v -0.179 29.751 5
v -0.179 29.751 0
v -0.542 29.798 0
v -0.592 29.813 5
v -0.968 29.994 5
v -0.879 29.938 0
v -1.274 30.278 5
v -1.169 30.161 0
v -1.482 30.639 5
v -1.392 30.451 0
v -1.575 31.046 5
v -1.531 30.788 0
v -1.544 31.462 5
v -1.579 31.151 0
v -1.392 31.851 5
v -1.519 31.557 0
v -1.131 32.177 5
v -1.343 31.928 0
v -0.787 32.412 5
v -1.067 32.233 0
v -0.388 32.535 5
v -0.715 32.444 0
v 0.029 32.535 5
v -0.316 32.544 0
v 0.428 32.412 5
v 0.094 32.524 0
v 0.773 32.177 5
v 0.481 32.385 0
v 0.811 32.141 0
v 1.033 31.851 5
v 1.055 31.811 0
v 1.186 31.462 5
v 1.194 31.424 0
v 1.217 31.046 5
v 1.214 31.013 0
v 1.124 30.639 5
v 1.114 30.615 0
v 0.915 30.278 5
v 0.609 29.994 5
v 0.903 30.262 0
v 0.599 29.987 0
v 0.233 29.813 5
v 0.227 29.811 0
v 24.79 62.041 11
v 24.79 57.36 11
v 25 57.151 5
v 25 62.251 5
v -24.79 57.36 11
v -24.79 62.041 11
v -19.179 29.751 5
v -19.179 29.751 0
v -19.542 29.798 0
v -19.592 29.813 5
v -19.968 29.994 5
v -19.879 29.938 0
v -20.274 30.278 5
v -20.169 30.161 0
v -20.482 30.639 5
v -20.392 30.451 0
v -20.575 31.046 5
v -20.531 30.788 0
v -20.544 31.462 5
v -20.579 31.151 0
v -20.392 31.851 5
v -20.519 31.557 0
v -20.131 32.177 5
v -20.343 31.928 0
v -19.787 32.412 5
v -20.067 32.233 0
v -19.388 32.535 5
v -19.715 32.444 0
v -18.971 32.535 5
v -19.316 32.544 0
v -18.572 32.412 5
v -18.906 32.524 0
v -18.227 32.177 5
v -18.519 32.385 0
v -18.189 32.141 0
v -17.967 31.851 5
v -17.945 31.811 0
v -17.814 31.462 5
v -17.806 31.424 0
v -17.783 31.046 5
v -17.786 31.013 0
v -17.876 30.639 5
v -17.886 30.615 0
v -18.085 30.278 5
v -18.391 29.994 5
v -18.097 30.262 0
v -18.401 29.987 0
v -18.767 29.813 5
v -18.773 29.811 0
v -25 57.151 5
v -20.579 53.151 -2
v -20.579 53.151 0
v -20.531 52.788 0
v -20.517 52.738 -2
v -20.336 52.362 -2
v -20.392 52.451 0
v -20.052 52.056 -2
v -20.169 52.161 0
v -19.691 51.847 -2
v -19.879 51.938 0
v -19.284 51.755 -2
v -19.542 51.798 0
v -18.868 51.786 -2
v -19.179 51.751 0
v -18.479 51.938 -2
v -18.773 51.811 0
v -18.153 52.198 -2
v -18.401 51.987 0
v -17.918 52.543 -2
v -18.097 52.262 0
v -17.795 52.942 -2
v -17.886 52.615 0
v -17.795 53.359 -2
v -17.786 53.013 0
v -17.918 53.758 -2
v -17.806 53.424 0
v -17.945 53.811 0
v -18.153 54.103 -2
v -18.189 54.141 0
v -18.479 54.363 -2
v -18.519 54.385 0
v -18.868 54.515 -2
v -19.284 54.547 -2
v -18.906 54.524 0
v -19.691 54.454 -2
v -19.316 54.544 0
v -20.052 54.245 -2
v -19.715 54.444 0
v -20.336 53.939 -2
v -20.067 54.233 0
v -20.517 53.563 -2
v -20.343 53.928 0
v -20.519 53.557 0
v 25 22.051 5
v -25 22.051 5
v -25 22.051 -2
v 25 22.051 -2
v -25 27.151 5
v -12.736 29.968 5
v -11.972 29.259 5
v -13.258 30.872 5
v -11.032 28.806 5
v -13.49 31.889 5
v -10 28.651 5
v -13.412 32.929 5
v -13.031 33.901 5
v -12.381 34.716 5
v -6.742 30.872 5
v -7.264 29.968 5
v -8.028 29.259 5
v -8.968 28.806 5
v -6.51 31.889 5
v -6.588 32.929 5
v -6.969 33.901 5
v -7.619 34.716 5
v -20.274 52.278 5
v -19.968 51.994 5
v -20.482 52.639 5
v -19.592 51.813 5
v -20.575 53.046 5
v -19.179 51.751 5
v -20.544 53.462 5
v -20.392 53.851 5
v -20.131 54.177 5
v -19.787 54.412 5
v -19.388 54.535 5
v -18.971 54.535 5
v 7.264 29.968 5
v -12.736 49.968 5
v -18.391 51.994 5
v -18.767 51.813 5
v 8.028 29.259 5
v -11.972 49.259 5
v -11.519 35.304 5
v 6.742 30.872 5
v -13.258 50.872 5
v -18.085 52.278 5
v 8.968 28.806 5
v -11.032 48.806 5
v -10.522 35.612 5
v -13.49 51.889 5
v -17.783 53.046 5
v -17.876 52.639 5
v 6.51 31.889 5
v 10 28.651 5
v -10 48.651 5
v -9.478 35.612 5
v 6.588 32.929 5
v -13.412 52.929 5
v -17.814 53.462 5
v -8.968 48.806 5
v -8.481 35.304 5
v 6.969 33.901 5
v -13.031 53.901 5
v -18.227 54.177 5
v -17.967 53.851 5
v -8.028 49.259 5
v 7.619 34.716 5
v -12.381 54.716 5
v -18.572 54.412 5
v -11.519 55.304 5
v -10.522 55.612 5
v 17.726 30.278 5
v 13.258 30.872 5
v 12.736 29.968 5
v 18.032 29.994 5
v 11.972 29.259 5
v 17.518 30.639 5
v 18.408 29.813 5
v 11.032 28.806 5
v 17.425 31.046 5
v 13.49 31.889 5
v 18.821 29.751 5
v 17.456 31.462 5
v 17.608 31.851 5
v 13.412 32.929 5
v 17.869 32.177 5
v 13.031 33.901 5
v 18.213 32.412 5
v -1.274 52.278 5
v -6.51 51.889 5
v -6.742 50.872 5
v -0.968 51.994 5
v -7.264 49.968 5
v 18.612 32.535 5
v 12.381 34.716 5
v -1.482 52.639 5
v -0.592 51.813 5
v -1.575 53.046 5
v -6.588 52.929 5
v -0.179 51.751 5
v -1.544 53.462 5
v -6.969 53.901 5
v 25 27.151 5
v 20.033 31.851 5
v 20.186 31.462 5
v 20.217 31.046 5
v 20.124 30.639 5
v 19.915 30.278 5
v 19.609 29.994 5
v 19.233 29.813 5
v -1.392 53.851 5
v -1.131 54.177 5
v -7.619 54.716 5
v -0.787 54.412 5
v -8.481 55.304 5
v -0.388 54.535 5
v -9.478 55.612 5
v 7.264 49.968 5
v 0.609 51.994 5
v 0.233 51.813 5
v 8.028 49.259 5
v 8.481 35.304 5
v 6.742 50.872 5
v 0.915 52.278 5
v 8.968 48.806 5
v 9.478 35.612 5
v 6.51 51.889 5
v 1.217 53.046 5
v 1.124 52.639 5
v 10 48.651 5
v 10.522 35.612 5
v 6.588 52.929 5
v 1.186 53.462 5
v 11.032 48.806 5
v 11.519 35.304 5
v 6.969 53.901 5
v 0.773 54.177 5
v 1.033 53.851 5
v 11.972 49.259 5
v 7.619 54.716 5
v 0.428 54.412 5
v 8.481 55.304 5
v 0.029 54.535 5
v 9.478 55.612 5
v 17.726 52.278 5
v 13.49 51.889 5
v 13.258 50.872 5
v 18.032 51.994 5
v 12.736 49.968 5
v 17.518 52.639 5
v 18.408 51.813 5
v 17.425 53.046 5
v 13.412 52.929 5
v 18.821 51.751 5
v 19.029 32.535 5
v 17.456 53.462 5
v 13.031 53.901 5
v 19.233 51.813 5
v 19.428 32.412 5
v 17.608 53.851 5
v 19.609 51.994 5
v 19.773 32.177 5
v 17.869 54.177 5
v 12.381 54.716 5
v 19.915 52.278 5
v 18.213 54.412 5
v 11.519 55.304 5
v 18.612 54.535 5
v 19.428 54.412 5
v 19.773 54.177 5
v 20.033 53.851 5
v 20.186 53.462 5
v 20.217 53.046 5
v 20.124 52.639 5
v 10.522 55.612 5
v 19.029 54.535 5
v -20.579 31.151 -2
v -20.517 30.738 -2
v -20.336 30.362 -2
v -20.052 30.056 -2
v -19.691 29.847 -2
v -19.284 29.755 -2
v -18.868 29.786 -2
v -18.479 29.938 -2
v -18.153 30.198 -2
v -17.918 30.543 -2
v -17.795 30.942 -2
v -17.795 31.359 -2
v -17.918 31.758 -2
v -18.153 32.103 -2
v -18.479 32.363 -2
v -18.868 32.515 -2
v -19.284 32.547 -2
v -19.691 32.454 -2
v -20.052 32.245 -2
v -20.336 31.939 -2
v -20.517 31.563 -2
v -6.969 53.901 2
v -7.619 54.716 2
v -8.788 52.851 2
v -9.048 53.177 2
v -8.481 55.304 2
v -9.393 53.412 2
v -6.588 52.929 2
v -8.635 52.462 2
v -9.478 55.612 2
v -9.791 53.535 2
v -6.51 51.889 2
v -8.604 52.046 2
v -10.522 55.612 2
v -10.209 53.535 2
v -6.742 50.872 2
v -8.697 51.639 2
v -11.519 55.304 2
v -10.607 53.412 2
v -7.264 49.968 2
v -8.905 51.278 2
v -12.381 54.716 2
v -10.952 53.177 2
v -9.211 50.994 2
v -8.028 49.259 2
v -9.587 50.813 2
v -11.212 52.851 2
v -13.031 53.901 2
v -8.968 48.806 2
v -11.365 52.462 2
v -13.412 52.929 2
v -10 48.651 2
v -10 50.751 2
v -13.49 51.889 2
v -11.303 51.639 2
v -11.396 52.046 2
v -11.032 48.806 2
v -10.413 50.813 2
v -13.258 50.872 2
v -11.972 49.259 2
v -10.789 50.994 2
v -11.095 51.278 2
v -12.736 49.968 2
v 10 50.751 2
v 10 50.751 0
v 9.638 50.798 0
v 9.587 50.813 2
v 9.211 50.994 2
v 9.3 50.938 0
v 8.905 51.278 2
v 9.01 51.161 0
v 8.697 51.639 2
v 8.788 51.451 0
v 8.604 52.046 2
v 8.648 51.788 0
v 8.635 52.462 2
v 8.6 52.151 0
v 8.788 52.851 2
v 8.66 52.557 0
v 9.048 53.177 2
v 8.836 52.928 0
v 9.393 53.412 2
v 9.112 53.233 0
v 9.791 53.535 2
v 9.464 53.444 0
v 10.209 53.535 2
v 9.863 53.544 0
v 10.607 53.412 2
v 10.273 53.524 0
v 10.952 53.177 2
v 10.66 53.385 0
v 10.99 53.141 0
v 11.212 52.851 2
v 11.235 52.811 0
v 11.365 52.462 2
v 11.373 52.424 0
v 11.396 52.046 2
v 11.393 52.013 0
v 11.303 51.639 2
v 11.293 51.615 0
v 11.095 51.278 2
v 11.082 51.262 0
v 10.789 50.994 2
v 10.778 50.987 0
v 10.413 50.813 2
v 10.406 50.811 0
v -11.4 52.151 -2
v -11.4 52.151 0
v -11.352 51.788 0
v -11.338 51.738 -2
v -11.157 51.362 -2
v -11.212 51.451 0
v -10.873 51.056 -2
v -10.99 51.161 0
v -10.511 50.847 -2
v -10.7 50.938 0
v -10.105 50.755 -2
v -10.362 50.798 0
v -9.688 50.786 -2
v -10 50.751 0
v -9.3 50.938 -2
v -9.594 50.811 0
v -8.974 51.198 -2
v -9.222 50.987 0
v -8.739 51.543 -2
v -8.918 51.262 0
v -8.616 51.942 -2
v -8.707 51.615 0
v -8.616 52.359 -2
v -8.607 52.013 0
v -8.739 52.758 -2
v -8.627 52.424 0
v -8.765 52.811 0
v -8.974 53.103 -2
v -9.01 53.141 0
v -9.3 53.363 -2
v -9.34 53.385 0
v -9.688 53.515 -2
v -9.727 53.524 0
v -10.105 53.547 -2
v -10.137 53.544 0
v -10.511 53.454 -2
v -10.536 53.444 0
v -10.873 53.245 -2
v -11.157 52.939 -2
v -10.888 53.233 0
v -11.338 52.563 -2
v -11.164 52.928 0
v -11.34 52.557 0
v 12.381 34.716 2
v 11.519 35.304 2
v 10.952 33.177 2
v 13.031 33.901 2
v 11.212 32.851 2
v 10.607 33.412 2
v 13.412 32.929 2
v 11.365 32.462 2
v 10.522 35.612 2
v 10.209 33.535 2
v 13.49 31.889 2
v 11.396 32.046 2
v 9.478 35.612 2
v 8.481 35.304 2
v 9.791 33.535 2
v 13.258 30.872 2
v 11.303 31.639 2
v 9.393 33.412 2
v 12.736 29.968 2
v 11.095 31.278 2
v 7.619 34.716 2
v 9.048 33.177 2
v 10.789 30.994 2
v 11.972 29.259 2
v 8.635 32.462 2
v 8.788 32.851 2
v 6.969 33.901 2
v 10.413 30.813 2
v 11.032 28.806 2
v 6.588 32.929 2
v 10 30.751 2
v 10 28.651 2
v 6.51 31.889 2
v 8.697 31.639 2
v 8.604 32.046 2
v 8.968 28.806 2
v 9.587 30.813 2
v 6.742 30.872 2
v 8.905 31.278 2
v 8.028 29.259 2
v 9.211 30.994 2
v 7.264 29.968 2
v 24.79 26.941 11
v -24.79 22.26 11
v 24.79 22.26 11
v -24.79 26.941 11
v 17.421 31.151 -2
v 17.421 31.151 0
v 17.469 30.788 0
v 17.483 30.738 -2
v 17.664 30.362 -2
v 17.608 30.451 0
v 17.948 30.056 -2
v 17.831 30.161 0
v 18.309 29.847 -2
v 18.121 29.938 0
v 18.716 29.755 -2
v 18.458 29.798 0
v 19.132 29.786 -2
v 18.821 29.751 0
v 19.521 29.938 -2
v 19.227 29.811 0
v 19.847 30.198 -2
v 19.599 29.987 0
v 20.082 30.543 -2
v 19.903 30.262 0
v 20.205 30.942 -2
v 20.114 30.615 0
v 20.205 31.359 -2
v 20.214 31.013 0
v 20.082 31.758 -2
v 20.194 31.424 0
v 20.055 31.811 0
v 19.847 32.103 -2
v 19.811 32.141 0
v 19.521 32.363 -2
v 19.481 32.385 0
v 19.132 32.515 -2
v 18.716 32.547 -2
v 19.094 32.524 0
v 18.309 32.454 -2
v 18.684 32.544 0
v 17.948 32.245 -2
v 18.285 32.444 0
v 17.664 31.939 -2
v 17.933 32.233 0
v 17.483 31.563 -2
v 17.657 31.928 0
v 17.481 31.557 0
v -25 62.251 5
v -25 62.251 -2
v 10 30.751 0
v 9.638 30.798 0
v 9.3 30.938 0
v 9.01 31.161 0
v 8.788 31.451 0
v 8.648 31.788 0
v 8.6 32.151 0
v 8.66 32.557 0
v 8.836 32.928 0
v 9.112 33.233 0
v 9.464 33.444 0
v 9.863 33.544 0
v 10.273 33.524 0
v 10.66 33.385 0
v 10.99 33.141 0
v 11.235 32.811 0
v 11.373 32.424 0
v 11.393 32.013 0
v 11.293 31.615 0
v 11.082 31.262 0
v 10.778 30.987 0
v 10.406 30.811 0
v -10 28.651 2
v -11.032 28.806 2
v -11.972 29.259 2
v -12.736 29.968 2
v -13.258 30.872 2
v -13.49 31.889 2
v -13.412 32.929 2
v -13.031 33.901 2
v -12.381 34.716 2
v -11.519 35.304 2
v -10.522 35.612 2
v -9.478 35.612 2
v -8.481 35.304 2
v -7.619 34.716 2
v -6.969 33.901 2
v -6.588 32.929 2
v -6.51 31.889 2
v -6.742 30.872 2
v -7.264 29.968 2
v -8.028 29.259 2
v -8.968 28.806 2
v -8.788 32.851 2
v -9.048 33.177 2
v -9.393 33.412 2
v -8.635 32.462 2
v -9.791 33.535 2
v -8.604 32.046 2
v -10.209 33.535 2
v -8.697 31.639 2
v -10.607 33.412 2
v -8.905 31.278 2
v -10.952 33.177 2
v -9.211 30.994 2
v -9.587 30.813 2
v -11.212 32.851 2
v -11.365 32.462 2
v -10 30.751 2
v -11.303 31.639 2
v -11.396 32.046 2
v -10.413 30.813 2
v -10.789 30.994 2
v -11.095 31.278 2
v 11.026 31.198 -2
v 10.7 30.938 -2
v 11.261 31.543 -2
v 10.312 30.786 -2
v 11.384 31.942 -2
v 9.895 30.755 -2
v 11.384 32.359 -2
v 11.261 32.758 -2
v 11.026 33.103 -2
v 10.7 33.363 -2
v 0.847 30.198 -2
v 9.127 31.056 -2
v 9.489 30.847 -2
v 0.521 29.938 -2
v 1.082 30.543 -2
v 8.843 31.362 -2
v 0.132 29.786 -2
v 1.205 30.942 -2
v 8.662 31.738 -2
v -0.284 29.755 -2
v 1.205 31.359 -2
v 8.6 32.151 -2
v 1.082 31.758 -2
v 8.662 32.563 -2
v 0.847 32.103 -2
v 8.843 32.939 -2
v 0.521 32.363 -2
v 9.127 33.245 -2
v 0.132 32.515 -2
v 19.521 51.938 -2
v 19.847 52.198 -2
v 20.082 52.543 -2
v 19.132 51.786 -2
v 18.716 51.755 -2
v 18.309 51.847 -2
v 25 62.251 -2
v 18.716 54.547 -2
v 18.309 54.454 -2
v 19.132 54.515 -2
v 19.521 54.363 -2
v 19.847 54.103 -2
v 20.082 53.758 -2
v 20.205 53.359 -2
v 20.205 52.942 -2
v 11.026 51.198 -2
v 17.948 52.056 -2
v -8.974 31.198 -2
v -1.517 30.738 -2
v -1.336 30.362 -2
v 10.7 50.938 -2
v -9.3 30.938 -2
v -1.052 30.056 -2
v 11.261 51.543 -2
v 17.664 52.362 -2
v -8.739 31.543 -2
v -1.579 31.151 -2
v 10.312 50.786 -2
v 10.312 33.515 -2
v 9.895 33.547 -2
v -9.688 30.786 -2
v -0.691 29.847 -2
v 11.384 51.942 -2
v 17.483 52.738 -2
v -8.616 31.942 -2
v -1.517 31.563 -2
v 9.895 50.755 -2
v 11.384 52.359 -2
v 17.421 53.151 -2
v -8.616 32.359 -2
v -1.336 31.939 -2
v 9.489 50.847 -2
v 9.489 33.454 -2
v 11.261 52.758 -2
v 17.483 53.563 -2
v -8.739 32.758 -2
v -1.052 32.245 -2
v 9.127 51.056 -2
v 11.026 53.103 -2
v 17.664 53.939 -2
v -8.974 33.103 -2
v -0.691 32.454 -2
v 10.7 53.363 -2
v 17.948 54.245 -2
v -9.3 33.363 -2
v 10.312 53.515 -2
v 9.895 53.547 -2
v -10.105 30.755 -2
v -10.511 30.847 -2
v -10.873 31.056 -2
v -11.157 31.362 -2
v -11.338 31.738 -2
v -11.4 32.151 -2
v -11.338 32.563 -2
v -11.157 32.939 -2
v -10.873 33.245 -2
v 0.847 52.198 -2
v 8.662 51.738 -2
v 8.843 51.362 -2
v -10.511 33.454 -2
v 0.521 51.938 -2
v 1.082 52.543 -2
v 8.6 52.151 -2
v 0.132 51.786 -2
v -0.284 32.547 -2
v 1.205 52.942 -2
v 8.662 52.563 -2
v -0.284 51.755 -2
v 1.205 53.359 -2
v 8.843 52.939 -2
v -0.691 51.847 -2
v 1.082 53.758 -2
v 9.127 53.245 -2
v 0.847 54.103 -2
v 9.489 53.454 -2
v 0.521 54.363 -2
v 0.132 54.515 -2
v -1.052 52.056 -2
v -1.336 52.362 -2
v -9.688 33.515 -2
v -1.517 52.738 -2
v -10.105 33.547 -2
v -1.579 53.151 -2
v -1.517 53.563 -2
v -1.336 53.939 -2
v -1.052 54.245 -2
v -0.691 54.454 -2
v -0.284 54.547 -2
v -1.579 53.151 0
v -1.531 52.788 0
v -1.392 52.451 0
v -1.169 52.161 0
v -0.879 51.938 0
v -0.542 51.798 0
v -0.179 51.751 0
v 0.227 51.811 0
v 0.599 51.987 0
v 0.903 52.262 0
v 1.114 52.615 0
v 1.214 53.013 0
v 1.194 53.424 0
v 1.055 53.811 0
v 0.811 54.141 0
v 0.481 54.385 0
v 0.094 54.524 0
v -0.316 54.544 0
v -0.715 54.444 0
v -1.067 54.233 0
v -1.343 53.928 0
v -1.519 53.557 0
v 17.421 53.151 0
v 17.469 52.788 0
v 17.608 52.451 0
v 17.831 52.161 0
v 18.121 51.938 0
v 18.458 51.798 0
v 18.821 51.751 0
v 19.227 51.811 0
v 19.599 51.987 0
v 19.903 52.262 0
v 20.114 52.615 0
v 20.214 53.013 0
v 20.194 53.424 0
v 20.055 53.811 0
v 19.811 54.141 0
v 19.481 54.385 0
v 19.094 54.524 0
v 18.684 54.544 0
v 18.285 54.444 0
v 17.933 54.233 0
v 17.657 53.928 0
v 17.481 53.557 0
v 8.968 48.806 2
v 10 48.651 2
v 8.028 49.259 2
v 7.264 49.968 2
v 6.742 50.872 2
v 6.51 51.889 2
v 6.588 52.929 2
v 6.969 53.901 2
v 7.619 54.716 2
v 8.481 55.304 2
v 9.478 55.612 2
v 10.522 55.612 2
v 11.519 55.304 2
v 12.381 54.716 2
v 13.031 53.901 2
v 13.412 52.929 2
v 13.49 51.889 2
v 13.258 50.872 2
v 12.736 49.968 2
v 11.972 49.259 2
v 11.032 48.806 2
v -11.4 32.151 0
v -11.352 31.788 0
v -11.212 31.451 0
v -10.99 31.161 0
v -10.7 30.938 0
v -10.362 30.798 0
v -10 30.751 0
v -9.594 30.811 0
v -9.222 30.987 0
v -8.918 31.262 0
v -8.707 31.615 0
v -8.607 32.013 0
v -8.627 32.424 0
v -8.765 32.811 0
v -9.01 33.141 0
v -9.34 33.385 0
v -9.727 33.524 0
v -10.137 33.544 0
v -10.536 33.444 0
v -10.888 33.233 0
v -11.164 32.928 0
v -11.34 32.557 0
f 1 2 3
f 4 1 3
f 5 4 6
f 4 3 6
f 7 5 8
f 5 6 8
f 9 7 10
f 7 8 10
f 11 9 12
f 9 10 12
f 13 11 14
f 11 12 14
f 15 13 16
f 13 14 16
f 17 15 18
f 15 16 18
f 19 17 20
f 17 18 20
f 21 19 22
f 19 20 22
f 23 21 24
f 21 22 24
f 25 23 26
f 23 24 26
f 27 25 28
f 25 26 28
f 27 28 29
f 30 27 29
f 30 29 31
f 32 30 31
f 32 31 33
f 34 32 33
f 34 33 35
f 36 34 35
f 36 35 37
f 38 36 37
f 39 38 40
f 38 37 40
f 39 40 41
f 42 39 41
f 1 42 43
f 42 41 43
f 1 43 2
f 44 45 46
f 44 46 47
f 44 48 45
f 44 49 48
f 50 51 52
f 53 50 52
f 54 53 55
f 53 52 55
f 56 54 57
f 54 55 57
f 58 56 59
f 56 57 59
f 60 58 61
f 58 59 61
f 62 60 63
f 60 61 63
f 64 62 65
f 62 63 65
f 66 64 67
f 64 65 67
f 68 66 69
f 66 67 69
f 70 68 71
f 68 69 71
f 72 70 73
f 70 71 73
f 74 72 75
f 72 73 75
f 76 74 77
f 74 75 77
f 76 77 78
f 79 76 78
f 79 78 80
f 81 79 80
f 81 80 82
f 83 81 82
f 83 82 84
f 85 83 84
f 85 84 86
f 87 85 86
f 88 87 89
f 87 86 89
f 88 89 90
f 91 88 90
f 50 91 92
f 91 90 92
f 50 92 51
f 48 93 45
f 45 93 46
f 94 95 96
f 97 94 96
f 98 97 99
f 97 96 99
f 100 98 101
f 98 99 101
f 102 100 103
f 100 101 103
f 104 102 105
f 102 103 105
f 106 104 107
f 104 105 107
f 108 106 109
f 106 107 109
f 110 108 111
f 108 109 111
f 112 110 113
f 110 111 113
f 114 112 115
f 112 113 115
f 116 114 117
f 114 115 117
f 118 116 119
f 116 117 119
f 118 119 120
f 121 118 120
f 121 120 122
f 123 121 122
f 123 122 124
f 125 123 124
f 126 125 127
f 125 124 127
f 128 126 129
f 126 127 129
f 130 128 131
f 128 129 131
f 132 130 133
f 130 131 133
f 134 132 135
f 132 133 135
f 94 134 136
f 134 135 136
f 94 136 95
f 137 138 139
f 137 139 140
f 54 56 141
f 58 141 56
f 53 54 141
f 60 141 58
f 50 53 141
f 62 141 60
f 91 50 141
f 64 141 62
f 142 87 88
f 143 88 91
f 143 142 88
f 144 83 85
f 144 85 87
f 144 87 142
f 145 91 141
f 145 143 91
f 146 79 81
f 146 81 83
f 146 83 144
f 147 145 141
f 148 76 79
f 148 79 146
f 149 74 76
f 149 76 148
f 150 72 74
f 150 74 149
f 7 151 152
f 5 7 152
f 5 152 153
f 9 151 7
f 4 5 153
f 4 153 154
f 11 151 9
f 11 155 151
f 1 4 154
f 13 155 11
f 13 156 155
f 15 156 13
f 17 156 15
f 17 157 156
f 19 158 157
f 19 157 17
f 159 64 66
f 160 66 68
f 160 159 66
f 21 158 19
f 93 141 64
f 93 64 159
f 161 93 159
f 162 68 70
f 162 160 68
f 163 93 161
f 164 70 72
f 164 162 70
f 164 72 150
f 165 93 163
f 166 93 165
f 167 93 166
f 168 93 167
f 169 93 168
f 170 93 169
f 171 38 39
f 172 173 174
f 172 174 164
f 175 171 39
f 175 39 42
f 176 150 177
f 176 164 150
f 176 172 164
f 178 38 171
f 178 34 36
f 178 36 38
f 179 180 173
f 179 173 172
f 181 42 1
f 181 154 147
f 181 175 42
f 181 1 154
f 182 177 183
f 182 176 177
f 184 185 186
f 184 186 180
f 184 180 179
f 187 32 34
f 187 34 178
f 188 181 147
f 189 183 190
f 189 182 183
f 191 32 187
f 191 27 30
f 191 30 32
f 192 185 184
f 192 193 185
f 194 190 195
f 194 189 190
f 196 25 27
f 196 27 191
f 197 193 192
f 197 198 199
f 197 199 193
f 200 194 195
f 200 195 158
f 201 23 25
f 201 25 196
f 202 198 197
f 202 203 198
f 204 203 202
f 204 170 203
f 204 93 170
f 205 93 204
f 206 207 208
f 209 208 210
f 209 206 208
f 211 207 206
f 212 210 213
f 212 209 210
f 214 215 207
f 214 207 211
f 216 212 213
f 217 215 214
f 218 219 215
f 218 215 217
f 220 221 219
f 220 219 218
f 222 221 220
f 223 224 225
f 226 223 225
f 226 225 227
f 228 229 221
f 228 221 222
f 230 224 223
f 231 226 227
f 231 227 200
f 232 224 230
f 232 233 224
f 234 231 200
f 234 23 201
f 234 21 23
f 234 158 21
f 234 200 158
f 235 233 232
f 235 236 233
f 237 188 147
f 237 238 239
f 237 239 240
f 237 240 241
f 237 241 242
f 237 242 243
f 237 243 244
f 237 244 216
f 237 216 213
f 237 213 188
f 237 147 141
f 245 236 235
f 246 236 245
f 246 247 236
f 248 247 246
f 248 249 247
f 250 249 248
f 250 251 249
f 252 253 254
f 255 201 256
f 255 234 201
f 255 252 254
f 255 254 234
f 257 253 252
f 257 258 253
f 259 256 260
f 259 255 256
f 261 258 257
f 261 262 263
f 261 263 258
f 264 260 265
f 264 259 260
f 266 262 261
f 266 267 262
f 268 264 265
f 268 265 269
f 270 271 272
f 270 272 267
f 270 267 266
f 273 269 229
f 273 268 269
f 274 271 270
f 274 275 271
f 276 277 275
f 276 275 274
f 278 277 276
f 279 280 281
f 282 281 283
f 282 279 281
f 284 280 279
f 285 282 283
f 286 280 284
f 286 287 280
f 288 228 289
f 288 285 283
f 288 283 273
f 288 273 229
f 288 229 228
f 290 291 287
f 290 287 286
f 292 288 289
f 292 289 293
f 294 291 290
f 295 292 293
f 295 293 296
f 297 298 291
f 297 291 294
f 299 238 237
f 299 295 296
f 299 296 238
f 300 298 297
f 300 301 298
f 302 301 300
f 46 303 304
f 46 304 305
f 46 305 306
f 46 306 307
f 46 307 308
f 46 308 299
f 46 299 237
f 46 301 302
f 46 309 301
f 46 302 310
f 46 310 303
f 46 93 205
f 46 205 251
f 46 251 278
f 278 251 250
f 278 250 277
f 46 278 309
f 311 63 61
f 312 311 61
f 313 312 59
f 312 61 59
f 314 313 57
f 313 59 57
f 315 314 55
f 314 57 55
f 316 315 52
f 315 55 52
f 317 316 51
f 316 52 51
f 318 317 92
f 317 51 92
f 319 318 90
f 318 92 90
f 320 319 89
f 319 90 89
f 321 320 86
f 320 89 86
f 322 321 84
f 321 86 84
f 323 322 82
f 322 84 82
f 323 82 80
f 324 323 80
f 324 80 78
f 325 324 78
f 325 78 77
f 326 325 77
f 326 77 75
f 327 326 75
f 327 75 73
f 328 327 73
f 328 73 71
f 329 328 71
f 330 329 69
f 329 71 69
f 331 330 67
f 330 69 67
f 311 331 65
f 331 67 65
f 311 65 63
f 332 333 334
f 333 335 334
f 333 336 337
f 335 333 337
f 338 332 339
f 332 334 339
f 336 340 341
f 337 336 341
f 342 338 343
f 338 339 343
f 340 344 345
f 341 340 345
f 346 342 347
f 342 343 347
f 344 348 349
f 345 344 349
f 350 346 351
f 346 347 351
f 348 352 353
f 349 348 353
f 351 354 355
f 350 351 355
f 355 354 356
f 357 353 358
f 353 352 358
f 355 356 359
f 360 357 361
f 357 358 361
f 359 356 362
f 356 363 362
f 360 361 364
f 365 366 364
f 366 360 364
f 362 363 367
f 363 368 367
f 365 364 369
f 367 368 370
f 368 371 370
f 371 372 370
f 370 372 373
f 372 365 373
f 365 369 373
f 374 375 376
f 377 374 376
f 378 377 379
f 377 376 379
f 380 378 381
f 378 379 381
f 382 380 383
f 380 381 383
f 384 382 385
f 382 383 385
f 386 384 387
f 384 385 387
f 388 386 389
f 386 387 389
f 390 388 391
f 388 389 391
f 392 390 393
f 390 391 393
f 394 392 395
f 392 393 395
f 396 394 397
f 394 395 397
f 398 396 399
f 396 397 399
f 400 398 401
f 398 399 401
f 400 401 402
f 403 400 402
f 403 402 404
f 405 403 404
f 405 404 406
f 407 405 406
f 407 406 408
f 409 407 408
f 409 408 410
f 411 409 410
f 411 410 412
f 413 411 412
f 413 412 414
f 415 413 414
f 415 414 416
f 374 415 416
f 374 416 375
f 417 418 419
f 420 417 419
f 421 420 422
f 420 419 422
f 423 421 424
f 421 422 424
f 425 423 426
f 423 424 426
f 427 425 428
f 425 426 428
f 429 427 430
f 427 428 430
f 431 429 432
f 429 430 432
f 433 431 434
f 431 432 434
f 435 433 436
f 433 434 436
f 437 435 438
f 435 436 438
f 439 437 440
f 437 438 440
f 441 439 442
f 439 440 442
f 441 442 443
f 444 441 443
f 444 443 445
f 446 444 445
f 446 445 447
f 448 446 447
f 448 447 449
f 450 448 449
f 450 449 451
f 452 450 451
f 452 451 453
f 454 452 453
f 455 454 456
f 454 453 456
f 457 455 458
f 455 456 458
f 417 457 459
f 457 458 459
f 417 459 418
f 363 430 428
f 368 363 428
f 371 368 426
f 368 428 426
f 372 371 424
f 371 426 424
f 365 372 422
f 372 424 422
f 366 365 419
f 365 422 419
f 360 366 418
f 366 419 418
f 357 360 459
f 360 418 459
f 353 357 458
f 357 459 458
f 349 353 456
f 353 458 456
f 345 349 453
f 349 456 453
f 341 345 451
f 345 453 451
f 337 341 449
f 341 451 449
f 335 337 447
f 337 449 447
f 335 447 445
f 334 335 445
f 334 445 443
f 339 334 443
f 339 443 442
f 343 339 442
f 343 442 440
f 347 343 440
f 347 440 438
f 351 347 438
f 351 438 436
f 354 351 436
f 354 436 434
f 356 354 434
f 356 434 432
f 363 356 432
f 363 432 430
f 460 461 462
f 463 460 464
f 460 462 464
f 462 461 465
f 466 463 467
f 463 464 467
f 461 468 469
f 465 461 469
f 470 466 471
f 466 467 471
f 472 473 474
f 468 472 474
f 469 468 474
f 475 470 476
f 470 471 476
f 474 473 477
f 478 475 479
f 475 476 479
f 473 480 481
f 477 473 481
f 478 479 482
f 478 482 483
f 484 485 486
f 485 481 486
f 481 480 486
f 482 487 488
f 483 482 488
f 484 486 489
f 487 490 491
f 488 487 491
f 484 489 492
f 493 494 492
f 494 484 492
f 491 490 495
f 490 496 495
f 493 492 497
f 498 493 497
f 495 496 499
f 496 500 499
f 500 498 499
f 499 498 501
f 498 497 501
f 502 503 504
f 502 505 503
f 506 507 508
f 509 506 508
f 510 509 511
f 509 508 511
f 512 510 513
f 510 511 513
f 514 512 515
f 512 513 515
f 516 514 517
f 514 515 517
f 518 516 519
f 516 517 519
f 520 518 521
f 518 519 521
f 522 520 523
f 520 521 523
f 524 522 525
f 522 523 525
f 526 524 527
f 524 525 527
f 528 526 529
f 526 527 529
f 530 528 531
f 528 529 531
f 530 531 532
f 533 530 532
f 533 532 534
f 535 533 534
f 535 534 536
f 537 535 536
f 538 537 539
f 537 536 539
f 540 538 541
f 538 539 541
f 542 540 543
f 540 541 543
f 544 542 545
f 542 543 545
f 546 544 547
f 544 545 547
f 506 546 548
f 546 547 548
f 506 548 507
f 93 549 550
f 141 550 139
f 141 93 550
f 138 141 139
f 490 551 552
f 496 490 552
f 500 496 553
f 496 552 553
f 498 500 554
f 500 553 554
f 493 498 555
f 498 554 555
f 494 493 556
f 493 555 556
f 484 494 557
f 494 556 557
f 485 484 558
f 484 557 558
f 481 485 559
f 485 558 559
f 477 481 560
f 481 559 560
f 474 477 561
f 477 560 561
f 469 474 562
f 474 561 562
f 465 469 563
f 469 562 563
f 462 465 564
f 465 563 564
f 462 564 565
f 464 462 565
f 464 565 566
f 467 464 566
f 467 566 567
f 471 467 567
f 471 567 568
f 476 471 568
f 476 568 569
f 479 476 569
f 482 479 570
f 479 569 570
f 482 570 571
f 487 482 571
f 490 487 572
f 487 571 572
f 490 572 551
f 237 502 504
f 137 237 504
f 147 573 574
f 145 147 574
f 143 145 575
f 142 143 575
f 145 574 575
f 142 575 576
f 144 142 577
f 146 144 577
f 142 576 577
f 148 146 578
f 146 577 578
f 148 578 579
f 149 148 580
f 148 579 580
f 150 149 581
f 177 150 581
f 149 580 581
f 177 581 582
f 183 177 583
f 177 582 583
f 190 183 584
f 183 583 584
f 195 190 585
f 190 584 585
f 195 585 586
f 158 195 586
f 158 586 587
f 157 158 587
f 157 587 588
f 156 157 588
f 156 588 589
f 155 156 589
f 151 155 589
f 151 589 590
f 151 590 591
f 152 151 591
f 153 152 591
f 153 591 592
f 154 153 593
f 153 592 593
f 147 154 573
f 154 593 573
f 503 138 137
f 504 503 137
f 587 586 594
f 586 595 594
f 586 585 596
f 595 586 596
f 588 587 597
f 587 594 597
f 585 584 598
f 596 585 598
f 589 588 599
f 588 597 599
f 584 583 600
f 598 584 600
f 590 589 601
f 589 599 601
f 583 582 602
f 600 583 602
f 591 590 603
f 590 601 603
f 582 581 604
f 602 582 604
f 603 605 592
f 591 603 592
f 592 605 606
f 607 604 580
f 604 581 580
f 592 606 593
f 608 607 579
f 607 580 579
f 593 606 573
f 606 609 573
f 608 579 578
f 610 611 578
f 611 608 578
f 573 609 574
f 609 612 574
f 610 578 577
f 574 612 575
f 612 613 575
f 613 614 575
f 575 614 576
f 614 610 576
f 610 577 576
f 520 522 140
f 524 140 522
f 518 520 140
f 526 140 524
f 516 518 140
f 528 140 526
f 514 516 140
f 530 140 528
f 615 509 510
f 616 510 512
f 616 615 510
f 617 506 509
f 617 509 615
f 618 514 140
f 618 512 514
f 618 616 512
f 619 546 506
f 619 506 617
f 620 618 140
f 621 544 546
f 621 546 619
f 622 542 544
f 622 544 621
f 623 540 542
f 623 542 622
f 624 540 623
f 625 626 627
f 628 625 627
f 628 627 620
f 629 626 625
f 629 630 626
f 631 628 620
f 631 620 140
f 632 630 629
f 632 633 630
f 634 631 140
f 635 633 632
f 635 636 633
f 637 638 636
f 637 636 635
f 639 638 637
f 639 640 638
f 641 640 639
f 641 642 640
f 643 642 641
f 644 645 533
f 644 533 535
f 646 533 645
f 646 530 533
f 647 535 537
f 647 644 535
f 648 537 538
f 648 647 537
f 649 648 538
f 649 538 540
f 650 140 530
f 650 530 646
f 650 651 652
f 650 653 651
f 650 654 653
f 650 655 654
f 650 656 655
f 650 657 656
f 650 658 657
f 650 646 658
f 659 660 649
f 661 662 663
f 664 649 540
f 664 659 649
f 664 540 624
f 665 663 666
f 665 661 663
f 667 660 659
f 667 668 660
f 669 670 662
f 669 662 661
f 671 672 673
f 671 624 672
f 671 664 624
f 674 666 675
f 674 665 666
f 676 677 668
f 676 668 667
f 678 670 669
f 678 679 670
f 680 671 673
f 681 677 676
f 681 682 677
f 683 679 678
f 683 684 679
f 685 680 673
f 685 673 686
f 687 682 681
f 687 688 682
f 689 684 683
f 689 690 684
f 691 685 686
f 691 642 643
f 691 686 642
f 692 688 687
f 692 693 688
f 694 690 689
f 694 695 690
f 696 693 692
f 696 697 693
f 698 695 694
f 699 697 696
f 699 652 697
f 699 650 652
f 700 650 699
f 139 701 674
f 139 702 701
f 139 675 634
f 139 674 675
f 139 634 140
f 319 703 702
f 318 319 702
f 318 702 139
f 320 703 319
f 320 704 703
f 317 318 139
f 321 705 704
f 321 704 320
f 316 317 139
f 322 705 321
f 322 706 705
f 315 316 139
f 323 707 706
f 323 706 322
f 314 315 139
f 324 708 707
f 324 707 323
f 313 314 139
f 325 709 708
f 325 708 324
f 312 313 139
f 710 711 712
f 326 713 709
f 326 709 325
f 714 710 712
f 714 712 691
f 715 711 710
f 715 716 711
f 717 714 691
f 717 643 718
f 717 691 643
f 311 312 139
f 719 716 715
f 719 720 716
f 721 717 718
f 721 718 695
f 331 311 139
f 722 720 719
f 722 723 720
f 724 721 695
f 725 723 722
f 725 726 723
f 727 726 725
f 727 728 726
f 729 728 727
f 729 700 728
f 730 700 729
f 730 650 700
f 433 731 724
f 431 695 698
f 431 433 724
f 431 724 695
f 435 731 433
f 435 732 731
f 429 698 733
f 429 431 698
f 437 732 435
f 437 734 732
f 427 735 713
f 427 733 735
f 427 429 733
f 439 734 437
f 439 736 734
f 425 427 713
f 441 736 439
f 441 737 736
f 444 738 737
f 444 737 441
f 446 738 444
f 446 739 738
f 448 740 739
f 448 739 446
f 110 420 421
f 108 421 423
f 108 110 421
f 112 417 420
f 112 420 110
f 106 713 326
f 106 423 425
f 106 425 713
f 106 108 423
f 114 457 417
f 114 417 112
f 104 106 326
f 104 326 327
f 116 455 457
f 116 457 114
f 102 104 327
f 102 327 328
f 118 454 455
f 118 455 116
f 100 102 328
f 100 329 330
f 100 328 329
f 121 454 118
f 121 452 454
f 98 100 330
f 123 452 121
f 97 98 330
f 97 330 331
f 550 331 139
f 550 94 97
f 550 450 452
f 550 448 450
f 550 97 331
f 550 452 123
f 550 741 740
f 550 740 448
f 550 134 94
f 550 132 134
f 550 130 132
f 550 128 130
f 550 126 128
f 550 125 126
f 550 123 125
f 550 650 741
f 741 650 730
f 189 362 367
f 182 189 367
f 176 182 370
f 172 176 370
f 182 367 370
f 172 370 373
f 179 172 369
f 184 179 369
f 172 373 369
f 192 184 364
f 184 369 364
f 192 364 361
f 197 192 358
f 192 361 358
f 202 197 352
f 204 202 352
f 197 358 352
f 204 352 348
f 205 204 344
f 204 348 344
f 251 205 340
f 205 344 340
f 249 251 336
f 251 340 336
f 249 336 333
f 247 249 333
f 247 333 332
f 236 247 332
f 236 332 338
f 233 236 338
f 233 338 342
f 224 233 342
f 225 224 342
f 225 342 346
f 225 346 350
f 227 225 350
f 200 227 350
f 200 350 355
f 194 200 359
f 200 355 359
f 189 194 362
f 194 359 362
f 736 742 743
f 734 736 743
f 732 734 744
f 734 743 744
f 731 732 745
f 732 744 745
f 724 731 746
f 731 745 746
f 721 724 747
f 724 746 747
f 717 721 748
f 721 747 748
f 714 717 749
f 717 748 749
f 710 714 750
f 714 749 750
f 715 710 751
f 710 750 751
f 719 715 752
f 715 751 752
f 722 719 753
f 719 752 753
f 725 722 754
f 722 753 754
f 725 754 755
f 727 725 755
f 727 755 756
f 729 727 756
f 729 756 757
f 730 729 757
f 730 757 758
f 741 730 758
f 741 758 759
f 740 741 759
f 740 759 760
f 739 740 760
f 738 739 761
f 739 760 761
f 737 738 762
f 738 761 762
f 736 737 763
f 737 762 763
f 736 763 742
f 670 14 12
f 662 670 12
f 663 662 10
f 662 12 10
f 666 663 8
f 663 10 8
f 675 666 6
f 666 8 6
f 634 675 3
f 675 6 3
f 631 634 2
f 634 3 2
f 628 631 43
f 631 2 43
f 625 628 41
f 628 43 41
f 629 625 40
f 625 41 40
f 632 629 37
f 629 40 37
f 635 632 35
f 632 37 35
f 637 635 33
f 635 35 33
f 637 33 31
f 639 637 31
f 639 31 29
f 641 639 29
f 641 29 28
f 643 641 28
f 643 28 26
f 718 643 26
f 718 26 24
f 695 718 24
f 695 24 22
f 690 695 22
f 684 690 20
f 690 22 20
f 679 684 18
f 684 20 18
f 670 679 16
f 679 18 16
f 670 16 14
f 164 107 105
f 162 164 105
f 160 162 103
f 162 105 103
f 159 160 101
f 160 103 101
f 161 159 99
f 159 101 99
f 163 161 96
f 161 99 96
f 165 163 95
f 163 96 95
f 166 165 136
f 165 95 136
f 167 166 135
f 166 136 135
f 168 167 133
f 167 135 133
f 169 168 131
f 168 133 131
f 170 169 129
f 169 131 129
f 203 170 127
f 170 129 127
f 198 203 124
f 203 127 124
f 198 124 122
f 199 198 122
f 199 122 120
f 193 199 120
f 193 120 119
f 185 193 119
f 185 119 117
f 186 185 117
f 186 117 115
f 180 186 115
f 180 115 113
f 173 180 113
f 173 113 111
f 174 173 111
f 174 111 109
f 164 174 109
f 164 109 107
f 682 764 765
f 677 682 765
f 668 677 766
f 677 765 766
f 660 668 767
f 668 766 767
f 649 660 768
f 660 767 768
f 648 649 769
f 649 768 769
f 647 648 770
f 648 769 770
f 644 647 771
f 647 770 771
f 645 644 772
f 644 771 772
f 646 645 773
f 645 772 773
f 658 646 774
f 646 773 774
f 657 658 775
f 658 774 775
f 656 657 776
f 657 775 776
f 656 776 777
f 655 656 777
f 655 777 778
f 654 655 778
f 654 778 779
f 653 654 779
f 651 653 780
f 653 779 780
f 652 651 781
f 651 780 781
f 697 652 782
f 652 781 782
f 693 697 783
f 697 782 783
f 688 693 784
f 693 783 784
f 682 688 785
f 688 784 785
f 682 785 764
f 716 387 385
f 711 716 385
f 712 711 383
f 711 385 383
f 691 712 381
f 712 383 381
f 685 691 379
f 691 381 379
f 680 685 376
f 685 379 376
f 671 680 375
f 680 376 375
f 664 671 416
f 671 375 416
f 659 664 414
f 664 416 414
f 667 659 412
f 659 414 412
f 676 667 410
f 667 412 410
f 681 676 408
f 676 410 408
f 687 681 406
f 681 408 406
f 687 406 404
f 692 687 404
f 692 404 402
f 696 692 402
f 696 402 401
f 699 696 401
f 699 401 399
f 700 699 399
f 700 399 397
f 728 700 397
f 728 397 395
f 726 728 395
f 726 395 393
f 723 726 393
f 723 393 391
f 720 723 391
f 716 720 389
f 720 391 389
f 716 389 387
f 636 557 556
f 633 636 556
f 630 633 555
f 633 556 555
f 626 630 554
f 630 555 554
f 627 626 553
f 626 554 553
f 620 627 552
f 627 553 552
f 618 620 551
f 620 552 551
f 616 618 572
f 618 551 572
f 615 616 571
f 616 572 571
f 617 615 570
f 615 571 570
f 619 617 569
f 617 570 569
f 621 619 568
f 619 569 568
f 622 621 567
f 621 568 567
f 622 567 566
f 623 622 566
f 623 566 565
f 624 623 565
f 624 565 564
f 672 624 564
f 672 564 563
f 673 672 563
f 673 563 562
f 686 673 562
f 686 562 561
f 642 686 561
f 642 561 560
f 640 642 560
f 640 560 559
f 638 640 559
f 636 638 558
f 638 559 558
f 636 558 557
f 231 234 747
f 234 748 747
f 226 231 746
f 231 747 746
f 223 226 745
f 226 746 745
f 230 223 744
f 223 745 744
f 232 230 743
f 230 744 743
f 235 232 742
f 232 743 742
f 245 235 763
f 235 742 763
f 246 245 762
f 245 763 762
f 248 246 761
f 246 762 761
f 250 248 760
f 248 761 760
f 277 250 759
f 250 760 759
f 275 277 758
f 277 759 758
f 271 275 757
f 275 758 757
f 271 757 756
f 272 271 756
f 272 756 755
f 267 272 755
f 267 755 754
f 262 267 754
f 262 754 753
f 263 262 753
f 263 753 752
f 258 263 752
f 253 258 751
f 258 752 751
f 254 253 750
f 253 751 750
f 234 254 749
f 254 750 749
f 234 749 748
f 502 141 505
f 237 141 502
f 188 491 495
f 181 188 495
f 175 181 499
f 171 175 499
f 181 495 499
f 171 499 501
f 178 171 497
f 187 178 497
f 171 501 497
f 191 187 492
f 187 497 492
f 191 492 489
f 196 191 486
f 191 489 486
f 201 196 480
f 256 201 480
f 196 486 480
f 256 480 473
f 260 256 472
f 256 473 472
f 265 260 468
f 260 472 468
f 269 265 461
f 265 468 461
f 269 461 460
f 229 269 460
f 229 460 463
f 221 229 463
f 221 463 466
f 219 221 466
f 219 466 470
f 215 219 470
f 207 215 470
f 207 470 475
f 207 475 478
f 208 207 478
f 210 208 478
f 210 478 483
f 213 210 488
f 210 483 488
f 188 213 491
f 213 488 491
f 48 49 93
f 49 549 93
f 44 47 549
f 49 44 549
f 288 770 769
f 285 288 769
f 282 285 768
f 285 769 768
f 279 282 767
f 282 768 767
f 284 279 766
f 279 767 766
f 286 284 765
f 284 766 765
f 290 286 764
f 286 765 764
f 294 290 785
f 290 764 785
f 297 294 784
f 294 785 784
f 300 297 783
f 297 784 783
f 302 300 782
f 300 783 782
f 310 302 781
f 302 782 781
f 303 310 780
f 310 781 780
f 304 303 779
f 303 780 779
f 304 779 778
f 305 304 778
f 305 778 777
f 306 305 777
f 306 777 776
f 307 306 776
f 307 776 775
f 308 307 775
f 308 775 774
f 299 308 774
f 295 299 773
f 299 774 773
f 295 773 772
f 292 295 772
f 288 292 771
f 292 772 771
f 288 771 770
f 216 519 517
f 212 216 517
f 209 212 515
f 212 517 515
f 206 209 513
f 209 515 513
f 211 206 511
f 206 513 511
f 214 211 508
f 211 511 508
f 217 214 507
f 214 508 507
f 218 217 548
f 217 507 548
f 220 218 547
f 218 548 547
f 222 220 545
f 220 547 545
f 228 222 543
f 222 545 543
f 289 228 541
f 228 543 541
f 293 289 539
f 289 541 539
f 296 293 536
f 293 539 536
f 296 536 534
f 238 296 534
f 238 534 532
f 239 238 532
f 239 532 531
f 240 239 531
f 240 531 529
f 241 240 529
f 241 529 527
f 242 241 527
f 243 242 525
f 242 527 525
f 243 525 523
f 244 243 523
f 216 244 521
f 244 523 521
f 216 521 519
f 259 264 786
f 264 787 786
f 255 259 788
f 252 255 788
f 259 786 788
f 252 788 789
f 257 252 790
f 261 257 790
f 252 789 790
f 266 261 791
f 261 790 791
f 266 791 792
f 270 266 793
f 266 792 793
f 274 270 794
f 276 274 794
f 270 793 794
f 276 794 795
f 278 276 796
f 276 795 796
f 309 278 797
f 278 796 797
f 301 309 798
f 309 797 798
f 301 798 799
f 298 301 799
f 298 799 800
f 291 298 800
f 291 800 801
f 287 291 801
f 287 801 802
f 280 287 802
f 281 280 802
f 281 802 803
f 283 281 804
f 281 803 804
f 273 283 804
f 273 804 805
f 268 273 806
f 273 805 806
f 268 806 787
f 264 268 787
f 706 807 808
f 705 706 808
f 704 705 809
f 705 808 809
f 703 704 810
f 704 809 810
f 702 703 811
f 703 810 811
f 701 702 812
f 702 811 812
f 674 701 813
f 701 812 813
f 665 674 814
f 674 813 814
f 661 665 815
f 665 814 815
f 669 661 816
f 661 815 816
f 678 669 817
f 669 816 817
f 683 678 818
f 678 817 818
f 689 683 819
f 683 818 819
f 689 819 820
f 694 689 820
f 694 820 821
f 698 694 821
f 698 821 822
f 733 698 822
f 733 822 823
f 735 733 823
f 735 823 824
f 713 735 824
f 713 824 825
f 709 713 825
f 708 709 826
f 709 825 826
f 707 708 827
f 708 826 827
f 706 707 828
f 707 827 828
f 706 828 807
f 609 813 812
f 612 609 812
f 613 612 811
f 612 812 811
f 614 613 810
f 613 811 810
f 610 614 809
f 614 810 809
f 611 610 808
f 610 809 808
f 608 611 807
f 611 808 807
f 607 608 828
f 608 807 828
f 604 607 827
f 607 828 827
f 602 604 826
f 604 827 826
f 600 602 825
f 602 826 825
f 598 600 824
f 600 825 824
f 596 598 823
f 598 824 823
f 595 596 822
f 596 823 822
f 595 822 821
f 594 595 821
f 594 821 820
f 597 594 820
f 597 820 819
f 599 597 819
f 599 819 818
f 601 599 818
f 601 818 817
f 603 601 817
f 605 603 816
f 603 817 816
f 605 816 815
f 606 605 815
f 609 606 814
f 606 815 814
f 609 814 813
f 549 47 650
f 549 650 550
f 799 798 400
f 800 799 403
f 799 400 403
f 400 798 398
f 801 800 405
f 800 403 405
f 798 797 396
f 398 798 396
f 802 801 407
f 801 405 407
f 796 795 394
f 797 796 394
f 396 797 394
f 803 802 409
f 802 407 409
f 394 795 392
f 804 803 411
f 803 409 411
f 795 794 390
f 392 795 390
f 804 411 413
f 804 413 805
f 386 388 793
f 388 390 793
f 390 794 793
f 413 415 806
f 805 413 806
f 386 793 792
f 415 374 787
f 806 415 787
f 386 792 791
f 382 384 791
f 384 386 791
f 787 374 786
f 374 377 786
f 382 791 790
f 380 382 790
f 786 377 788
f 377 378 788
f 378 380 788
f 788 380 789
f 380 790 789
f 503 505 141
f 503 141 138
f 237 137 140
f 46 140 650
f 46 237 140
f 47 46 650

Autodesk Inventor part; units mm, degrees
ref_plane "YZ Plane" through (0, 0, 0) normal (1, 0, 0) x (0, 1, 0)
ref_plane "XZ Plane" through (0, 0, 0) normal (0, 1, 0) x (-1, 0, 0)
ref_plane "Arbeitsebene1" through (0, 0, 0) normal (0, 0, 1) x (1, 0, 0)
sketch "Skizze1" plane through (0, 0, 0) normal (0, 0, 1) x (1, 0, 0)
  line L0 (15, 26.0506) -> (15, 58.2506) projected
  line L1 (15, 58.2506) -> (-15, 58.2506) projected
  line L2 (-15, 58.2506) -> (-15, 26.0506) projected
  line L3 (-15, 26.0506) -> (15, 26.0506) projected
  circle A0 centre (10, 32.1506) radius 1.25 construction
  circle A1 centre (-10, 32.1506) radius 1.25 construction
  circle A2 centre (-10, 52.1506) radius 1.25 construction
  circle A3 centre (10, 52.1506) radius 1.25 construction
  circle A4 centre (7.5, 38.0506) radius 3.25 construction
  circle A5 centre (7.5, 46.2506) radius 3.25 construction
  circle A6 centre (-7.5, 38.0506) radius 3.25 construction
  circle A7 centre (-7.5, 46.2506) radius 3.25 construction
  line L4 (-65, 27.1506) -> (-65, 57.1506) projected
  circle A8 centre (10, 32.1506) radius 1.25
  circle A9 centre (-10, 32.1506) radius 1.25
  circle A10 centre (-10, 52.1506) radius 1.25
  circle A11 centre (10, 52.1506) radius 1.25
  line L5 (15, 58.2506) -> (25, 58.2506)
  line L6 (25, 58.2506) -> (25, 26.0506)
  line L7 (25, 26.0506) -> (15, 26.0506)
  line L8 (15, 26.0506) -> (15, 58.2506)
  line L9 (-15, 58.2506) -> (-25, 58.2506)
  line L10 (-25, 58.2506) -> (-25, 26.0506)
  line L11 (-25, 26.0506) -> (-15, 26.0506)
  line L12 (-15, 26.0506) -> (-15, 58.2506)
  line L13 (25, 26.0506) -> (-25, 26.0506)
  line L14 (-25, 26.0506) -> (-25, 22.0506)
  line L15 (-25, 22.0506) -> (25, 22.0506)
  line L16 (25, 22.0506) -> (25, 26.0506)
  line L17 (25, 58.2506) -> (-25, 58.2506)
  line L18 (-25, 58.2506) -> (-25, 62.2506)
  line L19 (-25, 62.2506) -> (25, 62.2506)
  line L20 (25, 62.2506) -> (25, 58.2506)
  point P0 (0, 0)
  dimension "d19" = 10
  dimension "d20" = 10
  dimension "d26" = 4
  dimension "d27" = 4
ref_plane "Arbeitsebene2" through (-72, 28.2506, 5) normal (0, 0, -1) x (0, 1, 0)
extrude "Extrusion1" add sketch "Skizze1" along normal up to surface (5 mm away)
sketch "Skizze2" plane through (-15, 58.2506, 5) normal (0, 0, 1) x (1, 0, 0)
  circle A0 centre (25, -26.1) radius 1.25 projected
  circle A1 centre (5, -26.1) radius 1.25 projected
  circle A2 centre (5, -6.1) radius 1.25 projected
  circle A3 centre (25, -6.1) radius 1.25 projected
  point P0 (15, -58.2506)
hole "Bohrung1" at (10, 32.1506, 5) at (-10, 32.1506, 5) at (-10, 52.1506, 5) at (10, 52.1506, 5) direction (0, 0, -1) diameter 2.8 end through all counterbore diameter 7 counterbore depth 3
sketch "Skizze3" plane through (-15, 58.2506, 5) normal (0, 0, 1) x (1, 0, 0)
  circle A0 centre (14.8208, -23.6) radius 1.7 projected
  circle A1 centre (14.8208, -8.6) radius 1.7 projected
  circle A2 centre (5, -6.1) radius 3.5 projected
  circle A3 centre (25, -26.1) radius 3.5 projected
  circle A4 centre (5, -26.1) radius 3.5 projected
  circle A5 centre (25, -6.1) radius 3.5 projected
  line L0 (-10, 0) -> (-10, -32.2) projected
  line L1 (-10, -16.1) -> (40, -16.1)
  line L2 (40, -32.2) -> (40, 0) projected
  circle A6 centre (14.8208, -5.1) radius 1.5853
  circle A7 centre (14.8208, -27.1) radius 2.0333
  point P0 (15, -58.2506)
  dimension "d24" = 11
  dimension "d25" = 11
hole "Bohrung2" at (-0.1792, 31.1506, 5) at (-0.1792, 53.1506, 5) direction (0, 0, -1) diameter 2.8 end through all
pattern_linear "Rechteckige Anordnung1" count 3 spacing 19 along (-1, 0, 0) of "Bohrung2" first direction both ways yes
sketch "Skizze5" plane through (-25, 62.2506, 5) normal (0, 0, 1) x (1, 0, 0)
  line L0 (-41, -5.1) -> (47, -5.1) projected
  line L1 (-24.541, -42.8) -> (44.8306, -42.8) projected
  line L2 (16.25, -40.0792) -> (10.75, -40.0792) projected
  line L3 (0, -40.2) -> (50, -40.2) projected
  line L4 (50, 0) -> (0, 0) projected
  line L5 (-41, -35.1) -> (47, -35.1) projected
  line L6 (50, 0) -> (0, 0)
  line L7 (0, 0) -> (0, -5.1)
  line L8 (0, -5.1) -> (50, -5.1)
  line L9 (50, -5.1) -> (50, 0)
  line L10 (0, -40.2) -> (50, -40.2) projected
  line L11 (0, 0) -> (0, -40.2) projected
  line L12 (50, -40.2) -> (0, -40.2)
  line L13 (0, -40.2) -> (0, -35.1)
  line L14 (0, -35.1) -> (50, -35.1)
  line L15 (50, -35.1) -> (50, -40.2)
  point P0 (25, -62.2506)
  point P1 (47, -5.1)
extrude "Extrusion3" add sketch "Skizze5" along normal blind 6 draft -2
sketch "Skizze6" plane through (0, 0, 0) normal (0, 0, -1) x (-1, 0, 0)
  circle A0 centre (19.1792, 31.1506) radius 1.4 projected
  circle A1 centre (19.1792, 53.1506) radius 1.4 projected
  circle A2 centre (-18.8208, 31.1506) radius 1.4 projected
  circle A3 centre (-18.8208, 53.1506) radius 1.4 projected
  circle A4 centre (0.1792, 31.1506) radius 1.4 projected
  circle A5 centre (0.1792, 53.1506) radius 1.4 projected
  circle A6 centre (10, 52.1506) radius 1.4 projected
  circle A7 centre (-10, 32.1506) radius 1.4 projected
  circle A8 centre (10, 32.1506) radius 1.4 projected
  circle A9 centre (-10, 52.1506) radius 1.4 projected
  line L0 (25, 62.2506) -> (25, 22.0506) projected
  line L1 (-25, 62.2506) -> (25, 62.2506) projected
  line L2 (-25, 22.0506) -> (-25, 62.2506) projected
  line L3 (25, 22.0506) -> (-25, 22.0506) projected
  point P0 (0, 0)
extrude "Extrusion4" add sketch "Skizze6" along normal blind 2
properties part number "20_Cube_Insert_Linear_Stage_NEMA11_china_xymount"
